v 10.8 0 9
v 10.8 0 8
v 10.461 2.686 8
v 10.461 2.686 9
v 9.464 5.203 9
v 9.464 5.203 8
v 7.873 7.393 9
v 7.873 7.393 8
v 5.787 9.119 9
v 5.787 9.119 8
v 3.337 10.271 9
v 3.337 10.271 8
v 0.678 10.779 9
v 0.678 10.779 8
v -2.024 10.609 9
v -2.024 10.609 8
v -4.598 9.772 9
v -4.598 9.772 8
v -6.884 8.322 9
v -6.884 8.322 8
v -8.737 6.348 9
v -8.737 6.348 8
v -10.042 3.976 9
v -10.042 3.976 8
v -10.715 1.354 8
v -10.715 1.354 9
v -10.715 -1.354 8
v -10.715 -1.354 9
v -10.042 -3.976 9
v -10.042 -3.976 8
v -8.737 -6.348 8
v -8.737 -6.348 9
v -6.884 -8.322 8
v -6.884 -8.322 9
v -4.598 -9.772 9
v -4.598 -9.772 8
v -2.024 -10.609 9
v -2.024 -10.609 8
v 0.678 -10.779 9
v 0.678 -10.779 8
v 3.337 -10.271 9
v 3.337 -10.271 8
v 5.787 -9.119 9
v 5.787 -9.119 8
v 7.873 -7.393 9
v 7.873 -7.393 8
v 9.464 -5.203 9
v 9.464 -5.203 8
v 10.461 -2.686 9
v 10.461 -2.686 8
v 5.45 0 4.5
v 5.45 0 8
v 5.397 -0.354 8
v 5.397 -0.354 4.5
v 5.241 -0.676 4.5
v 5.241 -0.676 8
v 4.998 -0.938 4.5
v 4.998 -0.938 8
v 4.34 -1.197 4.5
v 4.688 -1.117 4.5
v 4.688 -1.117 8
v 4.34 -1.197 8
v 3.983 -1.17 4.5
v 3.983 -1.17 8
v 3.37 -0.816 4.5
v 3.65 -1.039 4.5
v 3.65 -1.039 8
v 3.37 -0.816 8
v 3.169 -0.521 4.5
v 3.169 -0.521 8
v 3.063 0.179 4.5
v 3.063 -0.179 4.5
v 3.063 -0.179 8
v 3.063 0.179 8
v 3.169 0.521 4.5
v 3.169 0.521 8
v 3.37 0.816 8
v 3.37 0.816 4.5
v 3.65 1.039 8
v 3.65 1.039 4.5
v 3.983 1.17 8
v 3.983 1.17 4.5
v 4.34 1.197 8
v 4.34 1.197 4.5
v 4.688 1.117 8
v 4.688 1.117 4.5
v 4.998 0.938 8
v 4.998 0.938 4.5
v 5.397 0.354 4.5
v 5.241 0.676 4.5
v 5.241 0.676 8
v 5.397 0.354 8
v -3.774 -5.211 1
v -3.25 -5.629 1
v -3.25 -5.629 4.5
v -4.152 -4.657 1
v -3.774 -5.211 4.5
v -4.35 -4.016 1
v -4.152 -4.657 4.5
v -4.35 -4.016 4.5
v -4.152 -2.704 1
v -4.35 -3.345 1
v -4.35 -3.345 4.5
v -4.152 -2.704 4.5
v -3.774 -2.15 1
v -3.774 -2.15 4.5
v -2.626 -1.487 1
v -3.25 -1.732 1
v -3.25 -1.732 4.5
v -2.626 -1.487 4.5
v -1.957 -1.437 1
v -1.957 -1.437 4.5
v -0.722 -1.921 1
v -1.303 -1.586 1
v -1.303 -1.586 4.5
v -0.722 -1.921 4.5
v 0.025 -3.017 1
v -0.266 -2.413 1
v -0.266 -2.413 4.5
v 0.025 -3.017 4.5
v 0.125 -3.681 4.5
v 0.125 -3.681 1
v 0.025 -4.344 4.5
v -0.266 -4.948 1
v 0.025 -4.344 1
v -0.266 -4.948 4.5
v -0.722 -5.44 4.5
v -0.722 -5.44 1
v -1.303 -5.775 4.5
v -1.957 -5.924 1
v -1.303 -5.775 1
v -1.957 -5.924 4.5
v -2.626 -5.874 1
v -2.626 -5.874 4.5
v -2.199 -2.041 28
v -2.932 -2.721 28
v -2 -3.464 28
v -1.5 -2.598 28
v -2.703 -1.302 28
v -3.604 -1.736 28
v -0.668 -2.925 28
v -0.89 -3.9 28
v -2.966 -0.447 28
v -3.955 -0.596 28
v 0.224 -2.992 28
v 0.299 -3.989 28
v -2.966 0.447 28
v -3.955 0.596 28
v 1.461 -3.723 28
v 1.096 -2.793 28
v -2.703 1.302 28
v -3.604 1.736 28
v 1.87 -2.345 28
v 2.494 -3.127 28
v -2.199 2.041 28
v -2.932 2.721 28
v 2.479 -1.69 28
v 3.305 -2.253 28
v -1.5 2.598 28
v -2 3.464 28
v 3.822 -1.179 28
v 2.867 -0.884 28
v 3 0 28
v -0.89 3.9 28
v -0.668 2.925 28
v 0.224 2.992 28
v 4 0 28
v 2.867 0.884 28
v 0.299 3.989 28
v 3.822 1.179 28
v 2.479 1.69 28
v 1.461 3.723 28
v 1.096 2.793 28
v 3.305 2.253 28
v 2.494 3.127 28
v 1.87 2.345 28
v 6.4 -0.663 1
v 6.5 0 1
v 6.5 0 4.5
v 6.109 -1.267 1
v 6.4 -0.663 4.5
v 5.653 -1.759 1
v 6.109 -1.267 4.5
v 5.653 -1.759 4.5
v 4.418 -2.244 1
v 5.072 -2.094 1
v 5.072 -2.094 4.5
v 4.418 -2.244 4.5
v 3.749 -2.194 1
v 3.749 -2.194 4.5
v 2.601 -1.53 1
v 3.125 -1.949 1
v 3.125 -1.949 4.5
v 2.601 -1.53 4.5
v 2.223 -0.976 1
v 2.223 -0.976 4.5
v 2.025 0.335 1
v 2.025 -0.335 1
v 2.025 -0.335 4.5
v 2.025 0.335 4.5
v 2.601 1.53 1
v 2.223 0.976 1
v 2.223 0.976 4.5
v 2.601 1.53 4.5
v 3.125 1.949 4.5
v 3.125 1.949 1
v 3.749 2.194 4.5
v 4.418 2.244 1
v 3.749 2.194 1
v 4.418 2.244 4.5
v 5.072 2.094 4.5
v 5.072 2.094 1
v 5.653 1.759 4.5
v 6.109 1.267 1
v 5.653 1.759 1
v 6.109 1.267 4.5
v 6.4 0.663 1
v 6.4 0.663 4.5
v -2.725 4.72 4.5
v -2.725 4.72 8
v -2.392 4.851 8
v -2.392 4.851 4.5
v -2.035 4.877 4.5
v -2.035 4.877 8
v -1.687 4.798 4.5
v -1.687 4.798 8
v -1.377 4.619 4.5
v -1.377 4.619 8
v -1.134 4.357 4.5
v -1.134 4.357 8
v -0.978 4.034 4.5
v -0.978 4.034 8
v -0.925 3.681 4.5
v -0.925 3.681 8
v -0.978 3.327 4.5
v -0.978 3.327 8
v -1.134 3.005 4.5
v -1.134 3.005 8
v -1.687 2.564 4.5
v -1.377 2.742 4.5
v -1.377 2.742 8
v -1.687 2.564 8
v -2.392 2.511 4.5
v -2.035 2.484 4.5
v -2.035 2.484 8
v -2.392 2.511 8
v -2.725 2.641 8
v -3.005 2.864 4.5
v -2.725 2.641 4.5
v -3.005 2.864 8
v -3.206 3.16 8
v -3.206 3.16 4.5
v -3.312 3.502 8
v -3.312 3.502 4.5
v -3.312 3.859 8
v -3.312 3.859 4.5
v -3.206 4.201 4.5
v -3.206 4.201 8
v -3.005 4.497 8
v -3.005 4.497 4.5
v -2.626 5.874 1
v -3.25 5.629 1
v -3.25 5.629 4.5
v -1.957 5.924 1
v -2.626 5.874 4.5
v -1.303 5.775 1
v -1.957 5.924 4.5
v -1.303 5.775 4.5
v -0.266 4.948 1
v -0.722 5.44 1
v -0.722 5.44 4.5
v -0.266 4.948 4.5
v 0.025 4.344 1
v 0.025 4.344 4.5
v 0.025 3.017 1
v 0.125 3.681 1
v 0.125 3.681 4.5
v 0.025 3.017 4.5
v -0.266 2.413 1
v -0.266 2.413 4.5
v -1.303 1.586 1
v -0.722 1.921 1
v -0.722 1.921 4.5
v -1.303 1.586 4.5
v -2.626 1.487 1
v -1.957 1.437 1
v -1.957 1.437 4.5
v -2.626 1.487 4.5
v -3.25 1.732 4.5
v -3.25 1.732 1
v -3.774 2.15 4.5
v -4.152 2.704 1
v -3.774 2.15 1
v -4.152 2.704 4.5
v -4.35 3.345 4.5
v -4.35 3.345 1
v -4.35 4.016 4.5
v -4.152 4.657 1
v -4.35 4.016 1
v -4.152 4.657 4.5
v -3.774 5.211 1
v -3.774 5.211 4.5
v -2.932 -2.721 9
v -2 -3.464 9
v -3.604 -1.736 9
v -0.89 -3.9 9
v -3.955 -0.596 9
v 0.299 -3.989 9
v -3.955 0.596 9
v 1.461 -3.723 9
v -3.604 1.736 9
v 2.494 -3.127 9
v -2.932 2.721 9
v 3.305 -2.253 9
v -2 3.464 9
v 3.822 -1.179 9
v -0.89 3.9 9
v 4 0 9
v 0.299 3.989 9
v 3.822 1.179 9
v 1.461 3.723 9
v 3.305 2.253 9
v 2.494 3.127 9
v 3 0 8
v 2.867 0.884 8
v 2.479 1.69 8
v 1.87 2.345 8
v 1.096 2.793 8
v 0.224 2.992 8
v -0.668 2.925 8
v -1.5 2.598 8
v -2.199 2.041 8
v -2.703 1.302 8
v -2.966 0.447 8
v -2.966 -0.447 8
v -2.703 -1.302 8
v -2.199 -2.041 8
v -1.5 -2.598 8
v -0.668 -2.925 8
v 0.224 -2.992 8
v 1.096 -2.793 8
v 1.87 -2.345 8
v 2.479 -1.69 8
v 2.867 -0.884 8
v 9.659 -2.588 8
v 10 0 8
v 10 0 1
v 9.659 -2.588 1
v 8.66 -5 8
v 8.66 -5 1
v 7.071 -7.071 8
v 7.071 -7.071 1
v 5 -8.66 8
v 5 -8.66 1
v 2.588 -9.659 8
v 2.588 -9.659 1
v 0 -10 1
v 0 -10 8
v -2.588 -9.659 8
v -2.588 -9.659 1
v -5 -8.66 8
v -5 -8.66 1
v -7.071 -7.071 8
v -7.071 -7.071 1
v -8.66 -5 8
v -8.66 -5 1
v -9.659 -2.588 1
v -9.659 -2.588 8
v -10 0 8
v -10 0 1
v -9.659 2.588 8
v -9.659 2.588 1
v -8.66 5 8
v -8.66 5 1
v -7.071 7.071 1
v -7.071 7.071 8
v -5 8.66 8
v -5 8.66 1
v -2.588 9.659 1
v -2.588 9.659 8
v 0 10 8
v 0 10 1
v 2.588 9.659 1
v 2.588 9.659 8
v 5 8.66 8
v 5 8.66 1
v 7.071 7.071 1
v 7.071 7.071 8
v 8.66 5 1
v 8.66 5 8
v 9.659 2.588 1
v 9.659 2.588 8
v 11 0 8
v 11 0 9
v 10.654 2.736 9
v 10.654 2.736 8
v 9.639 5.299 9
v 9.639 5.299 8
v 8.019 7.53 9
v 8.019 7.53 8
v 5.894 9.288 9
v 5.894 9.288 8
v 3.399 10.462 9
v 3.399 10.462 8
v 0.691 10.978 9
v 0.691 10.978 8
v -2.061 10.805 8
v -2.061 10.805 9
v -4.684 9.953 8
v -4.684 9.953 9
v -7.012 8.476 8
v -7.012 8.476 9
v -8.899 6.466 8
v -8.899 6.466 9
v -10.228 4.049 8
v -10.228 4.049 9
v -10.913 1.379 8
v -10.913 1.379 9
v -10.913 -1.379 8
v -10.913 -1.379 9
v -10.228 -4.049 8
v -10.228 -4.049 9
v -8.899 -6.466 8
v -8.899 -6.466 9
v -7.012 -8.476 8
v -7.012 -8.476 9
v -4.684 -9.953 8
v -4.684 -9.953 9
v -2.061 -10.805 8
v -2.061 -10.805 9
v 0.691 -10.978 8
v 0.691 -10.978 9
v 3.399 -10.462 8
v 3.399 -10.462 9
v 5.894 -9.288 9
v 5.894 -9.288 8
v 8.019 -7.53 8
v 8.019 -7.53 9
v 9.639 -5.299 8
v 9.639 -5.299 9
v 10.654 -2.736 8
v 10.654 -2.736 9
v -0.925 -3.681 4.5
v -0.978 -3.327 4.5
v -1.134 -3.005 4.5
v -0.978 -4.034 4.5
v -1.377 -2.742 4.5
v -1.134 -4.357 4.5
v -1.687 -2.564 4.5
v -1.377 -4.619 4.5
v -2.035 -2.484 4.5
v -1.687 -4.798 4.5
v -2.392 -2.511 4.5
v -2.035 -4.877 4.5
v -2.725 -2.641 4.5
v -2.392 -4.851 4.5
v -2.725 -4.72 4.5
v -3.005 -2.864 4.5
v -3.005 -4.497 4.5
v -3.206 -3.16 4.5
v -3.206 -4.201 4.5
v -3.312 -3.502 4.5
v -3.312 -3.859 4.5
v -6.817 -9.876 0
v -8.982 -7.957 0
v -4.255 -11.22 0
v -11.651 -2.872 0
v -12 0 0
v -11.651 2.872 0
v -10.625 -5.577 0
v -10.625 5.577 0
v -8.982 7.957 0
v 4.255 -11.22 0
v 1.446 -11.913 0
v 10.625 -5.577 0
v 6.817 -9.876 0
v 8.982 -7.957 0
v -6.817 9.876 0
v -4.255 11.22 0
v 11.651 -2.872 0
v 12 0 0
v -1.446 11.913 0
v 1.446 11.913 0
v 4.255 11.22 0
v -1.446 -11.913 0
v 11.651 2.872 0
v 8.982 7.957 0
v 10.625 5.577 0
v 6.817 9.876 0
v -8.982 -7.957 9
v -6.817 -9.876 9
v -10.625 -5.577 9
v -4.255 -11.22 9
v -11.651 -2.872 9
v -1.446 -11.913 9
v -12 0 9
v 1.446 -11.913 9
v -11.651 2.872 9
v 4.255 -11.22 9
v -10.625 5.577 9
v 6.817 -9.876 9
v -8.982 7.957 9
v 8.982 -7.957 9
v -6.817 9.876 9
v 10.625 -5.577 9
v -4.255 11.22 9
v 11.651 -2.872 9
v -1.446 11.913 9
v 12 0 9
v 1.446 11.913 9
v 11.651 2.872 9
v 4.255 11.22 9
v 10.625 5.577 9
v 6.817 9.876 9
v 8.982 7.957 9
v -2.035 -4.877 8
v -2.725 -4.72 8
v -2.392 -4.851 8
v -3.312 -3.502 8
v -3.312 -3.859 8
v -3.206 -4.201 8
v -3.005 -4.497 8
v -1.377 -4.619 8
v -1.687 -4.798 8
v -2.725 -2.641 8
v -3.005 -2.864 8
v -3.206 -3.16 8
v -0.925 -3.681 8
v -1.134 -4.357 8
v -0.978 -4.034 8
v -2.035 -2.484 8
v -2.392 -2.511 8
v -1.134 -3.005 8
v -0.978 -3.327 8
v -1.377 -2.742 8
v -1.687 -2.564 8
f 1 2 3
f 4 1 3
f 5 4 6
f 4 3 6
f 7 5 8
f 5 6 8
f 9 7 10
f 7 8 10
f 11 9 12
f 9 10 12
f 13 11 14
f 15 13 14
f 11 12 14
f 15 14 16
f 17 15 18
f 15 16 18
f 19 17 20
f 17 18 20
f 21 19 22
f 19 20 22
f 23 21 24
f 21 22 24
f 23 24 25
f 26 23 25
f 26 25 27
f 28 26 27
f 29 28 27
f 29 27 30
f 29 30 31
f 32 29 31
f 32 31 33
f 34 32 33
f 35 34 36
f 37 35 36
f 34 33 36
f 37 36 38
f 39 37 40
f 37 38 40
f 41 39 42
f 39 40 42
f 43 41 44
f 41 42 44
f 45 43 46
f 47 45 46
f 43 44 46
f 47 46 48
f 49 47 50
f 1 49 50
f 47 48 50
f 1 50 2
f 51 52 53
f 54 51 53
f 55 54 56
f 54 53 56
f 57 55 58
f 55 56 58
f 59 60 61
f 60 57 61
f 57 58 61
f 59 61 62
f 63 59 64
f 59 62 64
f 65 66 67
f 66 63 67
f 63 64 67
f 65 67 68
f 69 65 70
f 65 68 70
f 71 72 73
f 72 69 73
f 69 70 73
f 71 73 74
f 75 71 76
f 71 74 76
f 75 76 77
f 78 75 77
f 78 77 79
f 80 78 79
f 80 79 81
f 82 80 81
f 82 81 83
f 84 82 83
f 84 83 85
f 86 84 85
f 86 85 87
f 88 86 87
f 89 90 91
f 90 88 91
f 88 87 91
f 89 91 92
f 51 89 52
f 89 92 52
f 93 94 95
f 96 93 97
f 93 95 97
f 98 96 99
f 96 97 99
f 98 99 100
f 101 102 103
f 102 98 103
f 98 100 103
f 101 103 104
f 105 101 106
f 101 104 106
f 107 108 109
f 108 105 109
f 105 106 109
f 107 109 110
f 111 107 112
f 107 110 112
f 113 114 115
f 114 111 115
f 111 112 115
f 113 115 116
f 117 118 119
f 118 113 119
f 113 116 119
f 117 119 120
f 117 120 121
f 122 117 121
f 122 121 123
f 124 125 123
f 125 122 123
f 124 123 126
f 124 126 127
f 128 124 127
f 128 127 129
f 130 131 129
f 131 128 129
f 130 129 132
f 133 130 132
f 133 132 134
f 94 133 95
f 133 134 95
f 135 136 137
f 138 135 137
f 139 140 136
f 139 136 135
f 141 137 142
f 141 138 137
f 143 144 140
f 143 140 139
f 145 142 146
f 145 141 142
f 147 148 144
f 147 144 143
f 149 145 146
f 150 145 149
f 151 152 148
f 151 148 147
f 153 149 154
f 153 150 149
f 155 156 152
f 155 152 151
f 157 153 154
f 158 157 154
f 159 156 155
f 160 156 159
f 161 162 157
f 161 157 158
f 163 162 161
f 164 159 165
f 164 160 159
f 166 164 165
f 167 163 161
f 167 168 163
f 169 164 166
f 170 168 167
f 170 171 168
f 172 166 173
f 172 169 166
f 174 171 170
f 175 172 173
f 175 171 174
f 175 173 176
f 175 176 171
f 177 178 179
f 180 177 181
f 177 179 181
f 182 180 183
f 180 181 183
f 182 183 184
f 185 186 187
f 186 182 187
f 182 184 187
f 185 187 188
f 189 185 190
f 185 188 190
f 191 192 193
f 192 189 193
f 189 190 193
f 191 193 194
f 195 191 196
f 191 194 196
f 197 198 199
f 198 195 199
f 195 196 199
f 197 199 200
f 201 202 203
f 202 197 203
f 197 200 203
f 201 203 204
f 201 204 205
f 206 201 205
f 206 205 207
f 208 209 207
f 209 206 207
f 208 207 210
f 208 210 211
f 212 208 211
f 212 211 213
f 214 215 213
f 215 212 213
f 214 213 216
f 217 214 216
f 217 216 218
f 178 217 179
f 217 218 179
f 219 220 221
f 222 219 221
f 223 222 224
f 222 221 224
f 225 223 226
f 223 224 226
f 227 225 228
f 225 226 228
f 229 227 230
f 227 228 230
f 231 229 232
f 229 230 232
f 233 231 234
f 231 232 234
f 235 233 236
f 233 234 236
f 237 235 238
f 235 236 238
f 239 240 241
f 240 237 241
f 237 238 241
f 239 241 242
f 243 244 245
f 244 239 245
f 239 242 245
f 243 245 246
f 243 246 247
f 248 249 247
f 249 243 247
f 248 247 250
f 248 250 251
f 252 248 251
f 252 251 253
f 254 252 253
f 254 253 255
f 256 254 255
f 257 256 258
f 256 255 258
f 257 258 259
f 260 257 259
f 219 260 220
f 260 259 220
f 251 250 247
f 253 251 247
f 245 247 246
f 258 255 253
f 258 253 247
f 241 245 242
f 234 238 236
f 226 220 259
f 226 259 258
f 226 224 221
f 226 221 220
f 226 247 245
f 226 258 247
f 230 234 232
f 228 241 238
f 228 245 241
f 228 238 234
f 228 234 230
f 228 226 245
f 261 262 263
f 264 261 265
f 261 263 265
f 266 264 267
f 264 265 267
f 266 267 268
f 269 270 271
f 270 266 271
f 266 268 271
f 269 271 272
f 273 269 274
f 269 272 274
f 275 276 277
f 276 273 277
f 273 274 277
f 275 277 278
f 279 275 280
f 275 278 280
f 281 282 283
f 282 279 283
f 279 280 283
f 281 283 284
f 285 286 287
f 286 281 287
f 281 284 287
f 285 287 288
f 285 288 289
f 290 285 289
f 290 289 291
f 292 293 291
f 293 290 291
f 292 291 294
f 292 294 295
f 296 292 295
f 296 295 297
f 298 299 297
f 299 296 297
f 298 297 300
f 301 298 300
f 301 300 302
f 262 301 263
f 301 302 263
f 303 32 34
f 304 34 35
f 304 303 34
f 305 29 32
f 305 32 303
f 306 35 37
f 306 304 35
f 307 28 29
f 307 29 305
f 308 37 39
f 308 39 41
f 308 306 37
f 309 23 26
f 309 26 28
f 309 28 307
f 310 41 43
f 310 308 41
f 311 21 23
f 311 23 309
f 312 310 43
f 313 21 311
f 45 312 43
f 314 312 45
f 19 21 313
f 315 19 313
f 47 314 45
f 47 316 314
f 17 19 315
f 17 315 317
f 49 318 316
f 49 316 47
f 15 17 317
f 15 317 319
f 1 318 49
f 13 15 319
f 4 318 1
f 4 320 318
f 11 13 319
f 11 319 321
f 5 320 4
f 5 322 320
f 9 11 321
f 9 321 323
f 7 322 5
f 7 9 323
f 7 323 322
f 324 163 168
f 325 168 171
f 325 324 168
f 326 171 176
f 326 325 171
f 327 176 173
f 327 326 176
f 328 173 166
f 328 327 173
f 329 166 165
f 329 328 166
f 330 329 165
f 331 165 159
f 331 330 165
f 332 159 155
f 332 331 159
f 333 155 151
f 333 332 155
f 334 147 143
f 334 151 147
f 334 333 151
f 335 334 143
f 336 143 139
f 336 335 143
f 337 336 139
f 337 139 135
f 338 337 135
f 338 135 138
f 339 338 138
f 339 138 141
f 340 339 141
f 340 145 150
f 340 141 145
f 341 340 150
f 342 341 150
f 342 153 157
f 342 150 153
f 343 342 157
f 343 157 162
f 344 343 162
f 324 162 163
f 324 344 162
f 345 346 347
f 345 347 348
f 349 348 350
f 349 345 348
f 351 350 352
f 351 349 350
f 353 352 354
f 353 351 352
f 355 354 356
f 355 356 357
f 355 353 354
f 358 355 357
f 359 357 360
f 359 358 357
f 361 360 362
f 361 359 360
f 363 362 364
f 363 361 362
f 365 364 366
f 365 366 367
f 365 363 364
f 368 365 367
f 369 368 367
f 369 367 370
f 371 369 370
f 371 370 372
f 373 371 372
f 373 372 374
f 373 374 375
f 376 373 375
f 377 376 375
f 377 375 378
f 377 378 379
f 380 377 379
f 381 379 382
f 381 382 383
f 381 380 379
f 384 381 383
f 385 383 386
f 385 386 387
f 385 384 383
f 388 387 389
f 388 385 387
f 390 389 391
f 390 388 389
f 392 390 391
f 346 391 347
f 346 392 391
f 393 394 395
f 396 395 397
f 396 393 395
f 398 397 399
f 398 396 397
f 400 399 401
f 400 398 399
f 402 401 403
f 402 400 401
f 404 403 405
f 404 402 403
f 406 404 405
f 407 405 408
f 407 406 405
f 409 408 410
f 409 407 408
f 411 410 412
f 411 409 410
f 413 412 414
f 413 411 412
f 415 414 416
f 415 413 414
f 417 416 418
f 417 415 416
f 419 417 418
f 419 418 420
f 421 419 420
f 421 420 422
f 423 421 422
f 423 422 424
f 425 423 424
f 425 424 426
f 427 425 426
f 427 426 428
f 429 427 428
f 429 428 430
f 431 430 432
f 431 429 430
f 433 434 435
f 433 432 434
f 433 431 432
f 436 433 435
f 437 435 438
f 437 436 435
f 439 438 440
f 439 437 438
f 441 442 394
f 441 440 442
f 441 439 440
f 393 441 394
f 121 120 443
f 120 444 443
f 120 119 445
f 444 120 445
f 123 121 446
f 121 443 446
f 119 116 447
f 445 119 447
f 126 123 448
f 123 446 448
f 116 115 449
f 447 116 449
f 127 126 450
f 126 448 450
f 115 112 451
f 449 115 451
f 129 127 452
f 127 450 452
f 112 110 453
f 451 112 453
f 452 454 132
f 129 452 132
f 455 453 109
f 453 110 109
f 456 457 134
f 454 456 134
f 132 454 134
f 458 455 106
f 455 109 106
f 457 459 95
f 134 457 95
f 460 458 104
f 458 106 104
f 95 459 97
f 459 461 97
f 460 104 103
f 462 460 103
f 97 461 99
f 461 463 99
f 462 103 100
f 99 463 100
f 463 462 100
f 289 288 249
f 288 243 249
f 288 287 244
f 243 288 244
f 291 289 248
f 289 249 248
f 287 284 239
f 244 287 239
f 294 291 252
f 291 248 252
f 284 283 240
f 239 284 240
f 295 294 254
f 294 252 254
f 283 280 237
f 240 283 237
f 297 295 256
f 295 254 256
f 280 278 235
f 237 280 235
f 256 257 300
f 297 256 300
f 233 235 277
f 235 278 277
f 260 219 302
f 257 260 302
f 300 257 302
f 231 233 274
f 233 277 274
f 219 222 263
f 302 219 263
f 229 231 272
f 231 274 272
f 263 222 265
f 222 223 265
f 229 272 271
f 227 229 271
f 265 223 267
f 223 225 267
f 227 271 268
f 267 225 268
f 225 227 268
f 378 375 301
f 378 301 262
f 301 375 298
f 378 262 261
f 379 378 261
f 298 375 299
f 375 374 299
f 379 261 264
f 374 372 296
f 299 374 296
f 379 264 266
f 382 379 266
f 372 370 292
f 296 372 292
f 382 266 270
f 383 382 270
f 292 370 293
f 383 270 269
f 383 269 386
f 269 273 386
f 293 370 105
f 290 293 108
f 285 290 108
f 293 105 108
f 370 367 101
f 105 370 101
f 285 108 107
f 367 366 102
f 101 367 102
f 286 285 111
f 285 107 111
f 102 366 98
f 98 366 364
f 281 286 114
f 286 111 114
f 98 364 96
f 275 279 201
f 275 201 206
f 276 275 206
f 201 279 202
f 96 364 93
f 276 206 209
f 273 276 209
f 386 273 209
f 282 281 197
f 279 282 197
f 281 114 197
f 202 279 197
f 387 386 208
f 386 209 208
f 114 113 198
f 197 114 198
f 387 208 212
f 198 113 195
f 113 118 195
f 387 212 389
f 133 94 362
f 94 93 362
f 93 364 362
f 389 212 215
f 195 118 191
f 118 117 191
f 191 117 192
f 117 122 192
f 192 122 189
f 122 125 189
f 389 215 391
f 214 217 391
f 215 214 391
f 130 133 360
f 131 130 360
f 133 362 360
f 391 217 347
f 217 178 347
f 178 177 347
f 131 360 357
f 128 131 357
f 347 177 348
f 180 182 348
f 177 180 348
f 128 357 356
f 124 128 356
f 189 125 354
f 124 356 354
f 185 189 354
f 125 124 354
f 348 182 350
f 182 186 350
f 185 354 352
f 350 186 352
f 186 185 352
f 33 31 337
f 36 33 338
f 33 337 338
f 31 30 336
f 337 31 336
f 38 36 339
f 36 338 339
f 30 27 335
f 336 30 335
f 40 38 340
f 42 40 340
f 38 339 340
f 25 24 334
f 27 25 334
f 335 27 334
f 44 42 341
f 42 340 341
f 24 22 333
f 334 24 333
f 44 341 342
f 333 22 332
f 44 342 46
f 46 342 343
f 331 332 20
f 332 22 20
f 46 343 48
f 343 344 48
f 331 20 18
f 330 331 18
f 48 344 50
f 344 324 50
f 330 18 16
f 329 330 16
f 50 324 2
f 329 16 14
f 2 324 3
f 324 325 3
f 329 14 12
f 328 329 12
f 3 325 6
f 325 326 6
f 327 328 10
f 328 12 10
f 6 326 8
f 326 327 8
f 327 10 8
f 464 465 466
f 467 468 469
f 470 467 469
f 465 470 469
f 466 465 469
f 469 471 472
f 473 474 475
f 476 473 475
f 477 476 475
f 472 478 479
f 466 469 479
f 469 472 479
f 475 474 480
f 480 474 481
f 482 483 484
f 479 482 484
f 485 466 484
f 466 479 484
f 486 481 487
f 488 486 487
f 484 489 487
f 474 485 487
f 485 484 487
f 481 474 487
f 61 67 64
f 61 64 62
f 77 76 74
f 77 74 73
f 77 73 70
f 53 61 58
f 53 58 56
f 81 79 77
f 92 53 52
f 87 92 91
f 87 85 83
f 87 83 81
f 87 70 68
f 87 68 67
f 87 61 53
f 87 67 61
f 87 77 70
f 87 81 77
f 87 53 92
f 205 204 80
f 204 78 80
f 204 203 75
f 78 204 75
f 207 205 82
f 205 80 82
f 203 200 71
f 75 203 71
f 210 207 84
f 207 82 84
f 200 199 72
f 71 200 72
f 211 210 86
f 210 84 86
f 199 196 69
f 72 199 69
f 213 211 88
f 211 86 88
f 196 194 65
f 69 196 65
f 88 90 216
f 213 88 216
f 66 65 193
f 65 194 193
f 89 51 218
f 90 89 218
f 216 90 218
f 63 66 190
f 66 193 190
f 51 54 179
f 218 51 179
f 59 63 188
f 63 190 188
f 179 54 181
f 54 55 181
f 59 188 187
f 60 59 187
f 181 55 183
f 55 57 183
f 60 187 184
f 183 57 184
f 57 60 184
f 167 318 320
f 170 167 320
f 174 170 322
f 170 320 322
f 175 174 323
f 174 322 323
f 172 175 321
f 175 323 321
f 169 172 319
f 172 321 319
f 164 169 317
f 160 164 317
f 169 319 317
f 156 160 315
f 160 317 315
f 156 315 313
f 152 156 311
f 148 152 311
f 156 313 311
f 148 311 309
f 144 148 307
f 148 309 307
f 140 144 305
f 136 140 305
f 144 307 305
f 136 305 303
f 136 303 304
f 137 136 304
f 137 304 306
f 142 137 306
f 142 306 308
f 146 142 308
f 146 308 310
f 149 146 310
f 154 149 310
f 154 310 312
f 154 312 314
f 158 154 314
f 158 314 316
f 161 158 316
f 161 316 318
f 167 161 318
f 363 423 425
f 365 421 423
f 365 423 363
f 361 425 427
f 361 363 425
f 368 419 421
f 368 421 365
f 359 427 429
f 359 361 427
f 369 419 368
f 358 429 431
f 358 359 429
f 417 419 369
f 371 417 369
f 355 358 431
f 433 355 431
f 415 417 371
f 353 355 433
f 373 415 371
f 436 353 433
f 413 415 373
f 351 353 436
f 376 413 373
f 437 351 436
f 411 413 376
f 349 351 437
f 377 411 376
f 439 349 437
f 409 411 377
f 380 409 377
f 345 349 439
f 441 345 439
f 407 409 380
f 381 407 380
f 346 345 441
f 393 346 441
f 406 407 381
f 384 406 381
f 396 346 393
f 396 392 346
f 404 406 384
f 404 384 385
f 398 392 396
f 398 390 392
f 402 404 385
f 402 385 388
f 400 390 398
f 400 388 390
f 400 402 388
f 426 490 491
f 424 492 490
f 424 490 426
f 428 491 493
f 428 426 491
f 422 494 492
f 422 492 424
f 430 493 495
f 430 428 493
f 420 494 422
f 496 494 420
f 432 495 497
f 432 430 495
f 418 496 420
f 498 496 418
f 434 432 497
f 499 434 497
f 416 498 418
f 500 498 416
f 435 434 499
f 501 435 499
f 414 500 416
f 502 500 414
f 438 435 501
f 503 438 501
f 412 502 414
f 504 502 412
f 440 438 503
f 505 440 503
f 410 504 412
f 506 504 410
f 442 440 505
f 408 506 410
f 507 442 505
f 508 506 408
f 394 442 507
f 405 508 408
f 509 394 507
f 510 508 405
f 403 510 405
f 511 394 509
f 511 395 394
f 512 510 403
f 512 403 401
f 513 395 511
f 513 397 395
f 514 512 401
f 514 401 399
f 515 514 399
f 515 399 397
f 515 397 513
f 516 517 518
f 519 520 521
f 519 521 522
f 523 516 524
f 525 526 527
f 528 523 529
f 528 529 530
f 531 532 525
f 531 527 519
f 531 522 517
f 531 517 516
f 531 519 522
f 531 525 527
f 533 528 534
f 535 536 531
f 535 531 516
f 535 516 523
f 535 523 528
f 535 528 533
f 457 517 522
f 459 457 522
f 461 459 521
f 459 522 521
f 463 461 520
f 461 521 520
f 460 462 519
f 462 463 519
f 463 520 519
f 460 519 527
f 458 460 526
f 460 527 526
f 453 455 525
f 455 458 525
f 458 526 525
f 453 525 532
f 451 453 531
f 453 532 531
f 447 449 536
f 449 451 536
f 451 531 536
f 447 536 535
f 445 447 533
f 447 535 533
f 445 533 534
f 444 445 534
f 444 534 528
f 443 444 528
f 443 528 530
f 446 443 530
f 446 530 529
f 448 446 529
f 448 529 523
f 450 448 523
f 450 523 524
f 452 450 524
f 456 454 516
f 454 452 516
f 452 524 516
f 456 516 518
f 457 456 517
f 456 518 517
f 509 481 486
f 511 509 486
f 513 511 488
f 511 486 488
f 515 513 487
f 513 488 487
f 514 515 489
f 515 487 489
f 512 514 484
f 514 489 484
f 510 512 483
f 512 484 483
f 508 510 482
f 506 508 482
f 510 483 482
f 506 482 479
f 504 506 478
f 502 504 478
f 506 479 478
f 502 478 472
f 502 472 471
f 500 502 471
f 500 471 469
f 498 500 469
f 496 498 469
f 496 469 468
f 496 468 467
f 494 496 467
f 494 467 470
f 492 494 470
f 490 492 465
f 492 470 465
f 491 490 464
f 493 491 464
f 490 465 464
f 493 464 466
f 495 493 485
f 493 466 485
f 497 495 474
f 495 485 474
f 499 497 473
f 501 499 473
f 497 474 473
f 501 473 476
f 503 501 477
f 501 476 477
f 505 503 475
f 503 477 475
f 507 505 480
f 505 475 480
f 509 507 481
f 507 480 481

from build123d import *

# Parameters (mm, degrees)
CYLINDER158_R       = 3
CYLINDER158_DEPTH   = 23
CYLINDER161_R       = 10.8
CYLINDER161_DEPTH   = 1
CYLINDER159_R       = 4
CYLINDER159_DEPTH   = 20
CYLINDER157_R       = 2.25
CYLINDER157_DEPTH   = 7
CYLINDER156_R       = 1.2
CYLINDER156_DEPTH   = 14
CYLINDER147_R       = 1
CYLINDER147_DEPTH   = 1
ARRAY_COUNT         = 3
CYLINDER153_R       = 10
CYLINDER153_DEPTH   = 7
CUT_PLACEMENT_ANGLE = 180
CYLINDER160_R       = 11
CYLINDER160_DEPTH   = 4
CYLINDER_R          = 12
CYLINDER_DEPTH      = 9


with BuildPart() as cylinder001:
    # Cylinder158 → Cylinder158 (new body)
    with BuildSketch(Plane.XY.offset(8)):
        Circle(CYLINDER158_R)
    extrude(amount=CYLINDER158_DEPTH)


with BuildPart() as lid:
    # Cylinder161 → Cylinder161 (new body)
    with BuildSketch(Plane.XY.offset(8)):
        Circle(CYLINDER161_R)
    extrude(amount=CYLINDER161_DEPTH)


with BuildPart() as cut002:
    # Cylinder159 → Cylinder159 (new body)
    with BuildSketch(Plane.XY.offset(8)):
        Circle(CYLINDER159_R)
    extrude(amount=CYLINDER159_DEPTH)

    # Fusion001: union Lid
    add(lid.part)

    # Cut002: cut Cylinder001
    add(cylinder001.part, mode=Mode.SUBTRACT)


with BuildPart() as sealsubtraction:
    # Cylinder157 → Cylinder157 (new body)
    with BuildSketch(Plane.XY.offset(4.5)):
        Circle(CYLINDER157_R)
    extrude(amount=CYLINDER157_DEPTH)


with BuildPart() as bottomwireoutlet:
    # Cylinder156 → Cylinder156 (new body)
    with BuildSketch(Plane.XY.offset(-7)):
        Circle(CYLINDER156_R)
    extrude(amount=CYLINDER156_DEPTH)


with BuildPart() as sealarray:
    # Cylinder147 → Cylinder147 (new body)
    with BuildSketch(Plane.XY.offset(4.5)):
        Circle(CYLINDER147_R)
    extrude(amount=CYLINDER147_DEPTH)

    # Fusion: union SealSubtraction, BottomWireOutlet
    add(sealsubtraction.part)
    add(bottomwireoutlet.part)


with BuildPart() as sealarray_1:
    # Fusion placement: moved
    add(sealarray.part.moved(Location((4.25, 0, 0))))

    # Array: SealArray ×3 about axis
    array_axis = Axis((0, 0, 0), (0, 0, 1))


with BuildPart() as sealarray_2:
    add(sealarray_1.part)
    for i in range(1, ARRAY_COUNT):
        add(sealarray_1.part.rotate(array_axis, i * 360 / ARRAY_COUNT))


with BuildPart() as cut:
    # Cylinder153 → Cylinder153 (new body)
    with BuildSketch(Plane.XY.offset(1)):
        Circle(CYLINDER153_R)
    extrude(amount=CYLINDER153_DEPTH)

    # Cut: cut SealArray
    add(sealarray_2.part, mode=Mode.SUBTRACT)


with BuildPart() as cut_1:
    # Cut placement: moved
    add(cut.part.moved(Location((0, 0, 9))).rotate(Axis((0, 0, 9), (1, 0, 0)), CUT_PLACEMENT_ANGLE))


with BuildPart() as cylinder003:
    # Cylinder160 → Cylinder160 (new body)
    with BuildSketch(Plane.XY.offset(8)):
        Circle(CYLINDER160_R)
    extrude(amount=CYLINDER160_DEPTH)


with BuildPart() as cut003:
    # Cylinder → Cylinder (new body)
    with BuildSketch(Plane.XY):
        Circle(CYLINDER_R)
    extrude(amount=CYLINDER_DEPTH)

    # Cut001: cut Cylinder003
    add(cylinder003.part, mode=Mode.SUBTRACT)

    # Cut003: cut Cut
    add(cut_1.part, mode=Mode.SUBTRACT)


solid = Compound([cut002.part, cut003.part])
